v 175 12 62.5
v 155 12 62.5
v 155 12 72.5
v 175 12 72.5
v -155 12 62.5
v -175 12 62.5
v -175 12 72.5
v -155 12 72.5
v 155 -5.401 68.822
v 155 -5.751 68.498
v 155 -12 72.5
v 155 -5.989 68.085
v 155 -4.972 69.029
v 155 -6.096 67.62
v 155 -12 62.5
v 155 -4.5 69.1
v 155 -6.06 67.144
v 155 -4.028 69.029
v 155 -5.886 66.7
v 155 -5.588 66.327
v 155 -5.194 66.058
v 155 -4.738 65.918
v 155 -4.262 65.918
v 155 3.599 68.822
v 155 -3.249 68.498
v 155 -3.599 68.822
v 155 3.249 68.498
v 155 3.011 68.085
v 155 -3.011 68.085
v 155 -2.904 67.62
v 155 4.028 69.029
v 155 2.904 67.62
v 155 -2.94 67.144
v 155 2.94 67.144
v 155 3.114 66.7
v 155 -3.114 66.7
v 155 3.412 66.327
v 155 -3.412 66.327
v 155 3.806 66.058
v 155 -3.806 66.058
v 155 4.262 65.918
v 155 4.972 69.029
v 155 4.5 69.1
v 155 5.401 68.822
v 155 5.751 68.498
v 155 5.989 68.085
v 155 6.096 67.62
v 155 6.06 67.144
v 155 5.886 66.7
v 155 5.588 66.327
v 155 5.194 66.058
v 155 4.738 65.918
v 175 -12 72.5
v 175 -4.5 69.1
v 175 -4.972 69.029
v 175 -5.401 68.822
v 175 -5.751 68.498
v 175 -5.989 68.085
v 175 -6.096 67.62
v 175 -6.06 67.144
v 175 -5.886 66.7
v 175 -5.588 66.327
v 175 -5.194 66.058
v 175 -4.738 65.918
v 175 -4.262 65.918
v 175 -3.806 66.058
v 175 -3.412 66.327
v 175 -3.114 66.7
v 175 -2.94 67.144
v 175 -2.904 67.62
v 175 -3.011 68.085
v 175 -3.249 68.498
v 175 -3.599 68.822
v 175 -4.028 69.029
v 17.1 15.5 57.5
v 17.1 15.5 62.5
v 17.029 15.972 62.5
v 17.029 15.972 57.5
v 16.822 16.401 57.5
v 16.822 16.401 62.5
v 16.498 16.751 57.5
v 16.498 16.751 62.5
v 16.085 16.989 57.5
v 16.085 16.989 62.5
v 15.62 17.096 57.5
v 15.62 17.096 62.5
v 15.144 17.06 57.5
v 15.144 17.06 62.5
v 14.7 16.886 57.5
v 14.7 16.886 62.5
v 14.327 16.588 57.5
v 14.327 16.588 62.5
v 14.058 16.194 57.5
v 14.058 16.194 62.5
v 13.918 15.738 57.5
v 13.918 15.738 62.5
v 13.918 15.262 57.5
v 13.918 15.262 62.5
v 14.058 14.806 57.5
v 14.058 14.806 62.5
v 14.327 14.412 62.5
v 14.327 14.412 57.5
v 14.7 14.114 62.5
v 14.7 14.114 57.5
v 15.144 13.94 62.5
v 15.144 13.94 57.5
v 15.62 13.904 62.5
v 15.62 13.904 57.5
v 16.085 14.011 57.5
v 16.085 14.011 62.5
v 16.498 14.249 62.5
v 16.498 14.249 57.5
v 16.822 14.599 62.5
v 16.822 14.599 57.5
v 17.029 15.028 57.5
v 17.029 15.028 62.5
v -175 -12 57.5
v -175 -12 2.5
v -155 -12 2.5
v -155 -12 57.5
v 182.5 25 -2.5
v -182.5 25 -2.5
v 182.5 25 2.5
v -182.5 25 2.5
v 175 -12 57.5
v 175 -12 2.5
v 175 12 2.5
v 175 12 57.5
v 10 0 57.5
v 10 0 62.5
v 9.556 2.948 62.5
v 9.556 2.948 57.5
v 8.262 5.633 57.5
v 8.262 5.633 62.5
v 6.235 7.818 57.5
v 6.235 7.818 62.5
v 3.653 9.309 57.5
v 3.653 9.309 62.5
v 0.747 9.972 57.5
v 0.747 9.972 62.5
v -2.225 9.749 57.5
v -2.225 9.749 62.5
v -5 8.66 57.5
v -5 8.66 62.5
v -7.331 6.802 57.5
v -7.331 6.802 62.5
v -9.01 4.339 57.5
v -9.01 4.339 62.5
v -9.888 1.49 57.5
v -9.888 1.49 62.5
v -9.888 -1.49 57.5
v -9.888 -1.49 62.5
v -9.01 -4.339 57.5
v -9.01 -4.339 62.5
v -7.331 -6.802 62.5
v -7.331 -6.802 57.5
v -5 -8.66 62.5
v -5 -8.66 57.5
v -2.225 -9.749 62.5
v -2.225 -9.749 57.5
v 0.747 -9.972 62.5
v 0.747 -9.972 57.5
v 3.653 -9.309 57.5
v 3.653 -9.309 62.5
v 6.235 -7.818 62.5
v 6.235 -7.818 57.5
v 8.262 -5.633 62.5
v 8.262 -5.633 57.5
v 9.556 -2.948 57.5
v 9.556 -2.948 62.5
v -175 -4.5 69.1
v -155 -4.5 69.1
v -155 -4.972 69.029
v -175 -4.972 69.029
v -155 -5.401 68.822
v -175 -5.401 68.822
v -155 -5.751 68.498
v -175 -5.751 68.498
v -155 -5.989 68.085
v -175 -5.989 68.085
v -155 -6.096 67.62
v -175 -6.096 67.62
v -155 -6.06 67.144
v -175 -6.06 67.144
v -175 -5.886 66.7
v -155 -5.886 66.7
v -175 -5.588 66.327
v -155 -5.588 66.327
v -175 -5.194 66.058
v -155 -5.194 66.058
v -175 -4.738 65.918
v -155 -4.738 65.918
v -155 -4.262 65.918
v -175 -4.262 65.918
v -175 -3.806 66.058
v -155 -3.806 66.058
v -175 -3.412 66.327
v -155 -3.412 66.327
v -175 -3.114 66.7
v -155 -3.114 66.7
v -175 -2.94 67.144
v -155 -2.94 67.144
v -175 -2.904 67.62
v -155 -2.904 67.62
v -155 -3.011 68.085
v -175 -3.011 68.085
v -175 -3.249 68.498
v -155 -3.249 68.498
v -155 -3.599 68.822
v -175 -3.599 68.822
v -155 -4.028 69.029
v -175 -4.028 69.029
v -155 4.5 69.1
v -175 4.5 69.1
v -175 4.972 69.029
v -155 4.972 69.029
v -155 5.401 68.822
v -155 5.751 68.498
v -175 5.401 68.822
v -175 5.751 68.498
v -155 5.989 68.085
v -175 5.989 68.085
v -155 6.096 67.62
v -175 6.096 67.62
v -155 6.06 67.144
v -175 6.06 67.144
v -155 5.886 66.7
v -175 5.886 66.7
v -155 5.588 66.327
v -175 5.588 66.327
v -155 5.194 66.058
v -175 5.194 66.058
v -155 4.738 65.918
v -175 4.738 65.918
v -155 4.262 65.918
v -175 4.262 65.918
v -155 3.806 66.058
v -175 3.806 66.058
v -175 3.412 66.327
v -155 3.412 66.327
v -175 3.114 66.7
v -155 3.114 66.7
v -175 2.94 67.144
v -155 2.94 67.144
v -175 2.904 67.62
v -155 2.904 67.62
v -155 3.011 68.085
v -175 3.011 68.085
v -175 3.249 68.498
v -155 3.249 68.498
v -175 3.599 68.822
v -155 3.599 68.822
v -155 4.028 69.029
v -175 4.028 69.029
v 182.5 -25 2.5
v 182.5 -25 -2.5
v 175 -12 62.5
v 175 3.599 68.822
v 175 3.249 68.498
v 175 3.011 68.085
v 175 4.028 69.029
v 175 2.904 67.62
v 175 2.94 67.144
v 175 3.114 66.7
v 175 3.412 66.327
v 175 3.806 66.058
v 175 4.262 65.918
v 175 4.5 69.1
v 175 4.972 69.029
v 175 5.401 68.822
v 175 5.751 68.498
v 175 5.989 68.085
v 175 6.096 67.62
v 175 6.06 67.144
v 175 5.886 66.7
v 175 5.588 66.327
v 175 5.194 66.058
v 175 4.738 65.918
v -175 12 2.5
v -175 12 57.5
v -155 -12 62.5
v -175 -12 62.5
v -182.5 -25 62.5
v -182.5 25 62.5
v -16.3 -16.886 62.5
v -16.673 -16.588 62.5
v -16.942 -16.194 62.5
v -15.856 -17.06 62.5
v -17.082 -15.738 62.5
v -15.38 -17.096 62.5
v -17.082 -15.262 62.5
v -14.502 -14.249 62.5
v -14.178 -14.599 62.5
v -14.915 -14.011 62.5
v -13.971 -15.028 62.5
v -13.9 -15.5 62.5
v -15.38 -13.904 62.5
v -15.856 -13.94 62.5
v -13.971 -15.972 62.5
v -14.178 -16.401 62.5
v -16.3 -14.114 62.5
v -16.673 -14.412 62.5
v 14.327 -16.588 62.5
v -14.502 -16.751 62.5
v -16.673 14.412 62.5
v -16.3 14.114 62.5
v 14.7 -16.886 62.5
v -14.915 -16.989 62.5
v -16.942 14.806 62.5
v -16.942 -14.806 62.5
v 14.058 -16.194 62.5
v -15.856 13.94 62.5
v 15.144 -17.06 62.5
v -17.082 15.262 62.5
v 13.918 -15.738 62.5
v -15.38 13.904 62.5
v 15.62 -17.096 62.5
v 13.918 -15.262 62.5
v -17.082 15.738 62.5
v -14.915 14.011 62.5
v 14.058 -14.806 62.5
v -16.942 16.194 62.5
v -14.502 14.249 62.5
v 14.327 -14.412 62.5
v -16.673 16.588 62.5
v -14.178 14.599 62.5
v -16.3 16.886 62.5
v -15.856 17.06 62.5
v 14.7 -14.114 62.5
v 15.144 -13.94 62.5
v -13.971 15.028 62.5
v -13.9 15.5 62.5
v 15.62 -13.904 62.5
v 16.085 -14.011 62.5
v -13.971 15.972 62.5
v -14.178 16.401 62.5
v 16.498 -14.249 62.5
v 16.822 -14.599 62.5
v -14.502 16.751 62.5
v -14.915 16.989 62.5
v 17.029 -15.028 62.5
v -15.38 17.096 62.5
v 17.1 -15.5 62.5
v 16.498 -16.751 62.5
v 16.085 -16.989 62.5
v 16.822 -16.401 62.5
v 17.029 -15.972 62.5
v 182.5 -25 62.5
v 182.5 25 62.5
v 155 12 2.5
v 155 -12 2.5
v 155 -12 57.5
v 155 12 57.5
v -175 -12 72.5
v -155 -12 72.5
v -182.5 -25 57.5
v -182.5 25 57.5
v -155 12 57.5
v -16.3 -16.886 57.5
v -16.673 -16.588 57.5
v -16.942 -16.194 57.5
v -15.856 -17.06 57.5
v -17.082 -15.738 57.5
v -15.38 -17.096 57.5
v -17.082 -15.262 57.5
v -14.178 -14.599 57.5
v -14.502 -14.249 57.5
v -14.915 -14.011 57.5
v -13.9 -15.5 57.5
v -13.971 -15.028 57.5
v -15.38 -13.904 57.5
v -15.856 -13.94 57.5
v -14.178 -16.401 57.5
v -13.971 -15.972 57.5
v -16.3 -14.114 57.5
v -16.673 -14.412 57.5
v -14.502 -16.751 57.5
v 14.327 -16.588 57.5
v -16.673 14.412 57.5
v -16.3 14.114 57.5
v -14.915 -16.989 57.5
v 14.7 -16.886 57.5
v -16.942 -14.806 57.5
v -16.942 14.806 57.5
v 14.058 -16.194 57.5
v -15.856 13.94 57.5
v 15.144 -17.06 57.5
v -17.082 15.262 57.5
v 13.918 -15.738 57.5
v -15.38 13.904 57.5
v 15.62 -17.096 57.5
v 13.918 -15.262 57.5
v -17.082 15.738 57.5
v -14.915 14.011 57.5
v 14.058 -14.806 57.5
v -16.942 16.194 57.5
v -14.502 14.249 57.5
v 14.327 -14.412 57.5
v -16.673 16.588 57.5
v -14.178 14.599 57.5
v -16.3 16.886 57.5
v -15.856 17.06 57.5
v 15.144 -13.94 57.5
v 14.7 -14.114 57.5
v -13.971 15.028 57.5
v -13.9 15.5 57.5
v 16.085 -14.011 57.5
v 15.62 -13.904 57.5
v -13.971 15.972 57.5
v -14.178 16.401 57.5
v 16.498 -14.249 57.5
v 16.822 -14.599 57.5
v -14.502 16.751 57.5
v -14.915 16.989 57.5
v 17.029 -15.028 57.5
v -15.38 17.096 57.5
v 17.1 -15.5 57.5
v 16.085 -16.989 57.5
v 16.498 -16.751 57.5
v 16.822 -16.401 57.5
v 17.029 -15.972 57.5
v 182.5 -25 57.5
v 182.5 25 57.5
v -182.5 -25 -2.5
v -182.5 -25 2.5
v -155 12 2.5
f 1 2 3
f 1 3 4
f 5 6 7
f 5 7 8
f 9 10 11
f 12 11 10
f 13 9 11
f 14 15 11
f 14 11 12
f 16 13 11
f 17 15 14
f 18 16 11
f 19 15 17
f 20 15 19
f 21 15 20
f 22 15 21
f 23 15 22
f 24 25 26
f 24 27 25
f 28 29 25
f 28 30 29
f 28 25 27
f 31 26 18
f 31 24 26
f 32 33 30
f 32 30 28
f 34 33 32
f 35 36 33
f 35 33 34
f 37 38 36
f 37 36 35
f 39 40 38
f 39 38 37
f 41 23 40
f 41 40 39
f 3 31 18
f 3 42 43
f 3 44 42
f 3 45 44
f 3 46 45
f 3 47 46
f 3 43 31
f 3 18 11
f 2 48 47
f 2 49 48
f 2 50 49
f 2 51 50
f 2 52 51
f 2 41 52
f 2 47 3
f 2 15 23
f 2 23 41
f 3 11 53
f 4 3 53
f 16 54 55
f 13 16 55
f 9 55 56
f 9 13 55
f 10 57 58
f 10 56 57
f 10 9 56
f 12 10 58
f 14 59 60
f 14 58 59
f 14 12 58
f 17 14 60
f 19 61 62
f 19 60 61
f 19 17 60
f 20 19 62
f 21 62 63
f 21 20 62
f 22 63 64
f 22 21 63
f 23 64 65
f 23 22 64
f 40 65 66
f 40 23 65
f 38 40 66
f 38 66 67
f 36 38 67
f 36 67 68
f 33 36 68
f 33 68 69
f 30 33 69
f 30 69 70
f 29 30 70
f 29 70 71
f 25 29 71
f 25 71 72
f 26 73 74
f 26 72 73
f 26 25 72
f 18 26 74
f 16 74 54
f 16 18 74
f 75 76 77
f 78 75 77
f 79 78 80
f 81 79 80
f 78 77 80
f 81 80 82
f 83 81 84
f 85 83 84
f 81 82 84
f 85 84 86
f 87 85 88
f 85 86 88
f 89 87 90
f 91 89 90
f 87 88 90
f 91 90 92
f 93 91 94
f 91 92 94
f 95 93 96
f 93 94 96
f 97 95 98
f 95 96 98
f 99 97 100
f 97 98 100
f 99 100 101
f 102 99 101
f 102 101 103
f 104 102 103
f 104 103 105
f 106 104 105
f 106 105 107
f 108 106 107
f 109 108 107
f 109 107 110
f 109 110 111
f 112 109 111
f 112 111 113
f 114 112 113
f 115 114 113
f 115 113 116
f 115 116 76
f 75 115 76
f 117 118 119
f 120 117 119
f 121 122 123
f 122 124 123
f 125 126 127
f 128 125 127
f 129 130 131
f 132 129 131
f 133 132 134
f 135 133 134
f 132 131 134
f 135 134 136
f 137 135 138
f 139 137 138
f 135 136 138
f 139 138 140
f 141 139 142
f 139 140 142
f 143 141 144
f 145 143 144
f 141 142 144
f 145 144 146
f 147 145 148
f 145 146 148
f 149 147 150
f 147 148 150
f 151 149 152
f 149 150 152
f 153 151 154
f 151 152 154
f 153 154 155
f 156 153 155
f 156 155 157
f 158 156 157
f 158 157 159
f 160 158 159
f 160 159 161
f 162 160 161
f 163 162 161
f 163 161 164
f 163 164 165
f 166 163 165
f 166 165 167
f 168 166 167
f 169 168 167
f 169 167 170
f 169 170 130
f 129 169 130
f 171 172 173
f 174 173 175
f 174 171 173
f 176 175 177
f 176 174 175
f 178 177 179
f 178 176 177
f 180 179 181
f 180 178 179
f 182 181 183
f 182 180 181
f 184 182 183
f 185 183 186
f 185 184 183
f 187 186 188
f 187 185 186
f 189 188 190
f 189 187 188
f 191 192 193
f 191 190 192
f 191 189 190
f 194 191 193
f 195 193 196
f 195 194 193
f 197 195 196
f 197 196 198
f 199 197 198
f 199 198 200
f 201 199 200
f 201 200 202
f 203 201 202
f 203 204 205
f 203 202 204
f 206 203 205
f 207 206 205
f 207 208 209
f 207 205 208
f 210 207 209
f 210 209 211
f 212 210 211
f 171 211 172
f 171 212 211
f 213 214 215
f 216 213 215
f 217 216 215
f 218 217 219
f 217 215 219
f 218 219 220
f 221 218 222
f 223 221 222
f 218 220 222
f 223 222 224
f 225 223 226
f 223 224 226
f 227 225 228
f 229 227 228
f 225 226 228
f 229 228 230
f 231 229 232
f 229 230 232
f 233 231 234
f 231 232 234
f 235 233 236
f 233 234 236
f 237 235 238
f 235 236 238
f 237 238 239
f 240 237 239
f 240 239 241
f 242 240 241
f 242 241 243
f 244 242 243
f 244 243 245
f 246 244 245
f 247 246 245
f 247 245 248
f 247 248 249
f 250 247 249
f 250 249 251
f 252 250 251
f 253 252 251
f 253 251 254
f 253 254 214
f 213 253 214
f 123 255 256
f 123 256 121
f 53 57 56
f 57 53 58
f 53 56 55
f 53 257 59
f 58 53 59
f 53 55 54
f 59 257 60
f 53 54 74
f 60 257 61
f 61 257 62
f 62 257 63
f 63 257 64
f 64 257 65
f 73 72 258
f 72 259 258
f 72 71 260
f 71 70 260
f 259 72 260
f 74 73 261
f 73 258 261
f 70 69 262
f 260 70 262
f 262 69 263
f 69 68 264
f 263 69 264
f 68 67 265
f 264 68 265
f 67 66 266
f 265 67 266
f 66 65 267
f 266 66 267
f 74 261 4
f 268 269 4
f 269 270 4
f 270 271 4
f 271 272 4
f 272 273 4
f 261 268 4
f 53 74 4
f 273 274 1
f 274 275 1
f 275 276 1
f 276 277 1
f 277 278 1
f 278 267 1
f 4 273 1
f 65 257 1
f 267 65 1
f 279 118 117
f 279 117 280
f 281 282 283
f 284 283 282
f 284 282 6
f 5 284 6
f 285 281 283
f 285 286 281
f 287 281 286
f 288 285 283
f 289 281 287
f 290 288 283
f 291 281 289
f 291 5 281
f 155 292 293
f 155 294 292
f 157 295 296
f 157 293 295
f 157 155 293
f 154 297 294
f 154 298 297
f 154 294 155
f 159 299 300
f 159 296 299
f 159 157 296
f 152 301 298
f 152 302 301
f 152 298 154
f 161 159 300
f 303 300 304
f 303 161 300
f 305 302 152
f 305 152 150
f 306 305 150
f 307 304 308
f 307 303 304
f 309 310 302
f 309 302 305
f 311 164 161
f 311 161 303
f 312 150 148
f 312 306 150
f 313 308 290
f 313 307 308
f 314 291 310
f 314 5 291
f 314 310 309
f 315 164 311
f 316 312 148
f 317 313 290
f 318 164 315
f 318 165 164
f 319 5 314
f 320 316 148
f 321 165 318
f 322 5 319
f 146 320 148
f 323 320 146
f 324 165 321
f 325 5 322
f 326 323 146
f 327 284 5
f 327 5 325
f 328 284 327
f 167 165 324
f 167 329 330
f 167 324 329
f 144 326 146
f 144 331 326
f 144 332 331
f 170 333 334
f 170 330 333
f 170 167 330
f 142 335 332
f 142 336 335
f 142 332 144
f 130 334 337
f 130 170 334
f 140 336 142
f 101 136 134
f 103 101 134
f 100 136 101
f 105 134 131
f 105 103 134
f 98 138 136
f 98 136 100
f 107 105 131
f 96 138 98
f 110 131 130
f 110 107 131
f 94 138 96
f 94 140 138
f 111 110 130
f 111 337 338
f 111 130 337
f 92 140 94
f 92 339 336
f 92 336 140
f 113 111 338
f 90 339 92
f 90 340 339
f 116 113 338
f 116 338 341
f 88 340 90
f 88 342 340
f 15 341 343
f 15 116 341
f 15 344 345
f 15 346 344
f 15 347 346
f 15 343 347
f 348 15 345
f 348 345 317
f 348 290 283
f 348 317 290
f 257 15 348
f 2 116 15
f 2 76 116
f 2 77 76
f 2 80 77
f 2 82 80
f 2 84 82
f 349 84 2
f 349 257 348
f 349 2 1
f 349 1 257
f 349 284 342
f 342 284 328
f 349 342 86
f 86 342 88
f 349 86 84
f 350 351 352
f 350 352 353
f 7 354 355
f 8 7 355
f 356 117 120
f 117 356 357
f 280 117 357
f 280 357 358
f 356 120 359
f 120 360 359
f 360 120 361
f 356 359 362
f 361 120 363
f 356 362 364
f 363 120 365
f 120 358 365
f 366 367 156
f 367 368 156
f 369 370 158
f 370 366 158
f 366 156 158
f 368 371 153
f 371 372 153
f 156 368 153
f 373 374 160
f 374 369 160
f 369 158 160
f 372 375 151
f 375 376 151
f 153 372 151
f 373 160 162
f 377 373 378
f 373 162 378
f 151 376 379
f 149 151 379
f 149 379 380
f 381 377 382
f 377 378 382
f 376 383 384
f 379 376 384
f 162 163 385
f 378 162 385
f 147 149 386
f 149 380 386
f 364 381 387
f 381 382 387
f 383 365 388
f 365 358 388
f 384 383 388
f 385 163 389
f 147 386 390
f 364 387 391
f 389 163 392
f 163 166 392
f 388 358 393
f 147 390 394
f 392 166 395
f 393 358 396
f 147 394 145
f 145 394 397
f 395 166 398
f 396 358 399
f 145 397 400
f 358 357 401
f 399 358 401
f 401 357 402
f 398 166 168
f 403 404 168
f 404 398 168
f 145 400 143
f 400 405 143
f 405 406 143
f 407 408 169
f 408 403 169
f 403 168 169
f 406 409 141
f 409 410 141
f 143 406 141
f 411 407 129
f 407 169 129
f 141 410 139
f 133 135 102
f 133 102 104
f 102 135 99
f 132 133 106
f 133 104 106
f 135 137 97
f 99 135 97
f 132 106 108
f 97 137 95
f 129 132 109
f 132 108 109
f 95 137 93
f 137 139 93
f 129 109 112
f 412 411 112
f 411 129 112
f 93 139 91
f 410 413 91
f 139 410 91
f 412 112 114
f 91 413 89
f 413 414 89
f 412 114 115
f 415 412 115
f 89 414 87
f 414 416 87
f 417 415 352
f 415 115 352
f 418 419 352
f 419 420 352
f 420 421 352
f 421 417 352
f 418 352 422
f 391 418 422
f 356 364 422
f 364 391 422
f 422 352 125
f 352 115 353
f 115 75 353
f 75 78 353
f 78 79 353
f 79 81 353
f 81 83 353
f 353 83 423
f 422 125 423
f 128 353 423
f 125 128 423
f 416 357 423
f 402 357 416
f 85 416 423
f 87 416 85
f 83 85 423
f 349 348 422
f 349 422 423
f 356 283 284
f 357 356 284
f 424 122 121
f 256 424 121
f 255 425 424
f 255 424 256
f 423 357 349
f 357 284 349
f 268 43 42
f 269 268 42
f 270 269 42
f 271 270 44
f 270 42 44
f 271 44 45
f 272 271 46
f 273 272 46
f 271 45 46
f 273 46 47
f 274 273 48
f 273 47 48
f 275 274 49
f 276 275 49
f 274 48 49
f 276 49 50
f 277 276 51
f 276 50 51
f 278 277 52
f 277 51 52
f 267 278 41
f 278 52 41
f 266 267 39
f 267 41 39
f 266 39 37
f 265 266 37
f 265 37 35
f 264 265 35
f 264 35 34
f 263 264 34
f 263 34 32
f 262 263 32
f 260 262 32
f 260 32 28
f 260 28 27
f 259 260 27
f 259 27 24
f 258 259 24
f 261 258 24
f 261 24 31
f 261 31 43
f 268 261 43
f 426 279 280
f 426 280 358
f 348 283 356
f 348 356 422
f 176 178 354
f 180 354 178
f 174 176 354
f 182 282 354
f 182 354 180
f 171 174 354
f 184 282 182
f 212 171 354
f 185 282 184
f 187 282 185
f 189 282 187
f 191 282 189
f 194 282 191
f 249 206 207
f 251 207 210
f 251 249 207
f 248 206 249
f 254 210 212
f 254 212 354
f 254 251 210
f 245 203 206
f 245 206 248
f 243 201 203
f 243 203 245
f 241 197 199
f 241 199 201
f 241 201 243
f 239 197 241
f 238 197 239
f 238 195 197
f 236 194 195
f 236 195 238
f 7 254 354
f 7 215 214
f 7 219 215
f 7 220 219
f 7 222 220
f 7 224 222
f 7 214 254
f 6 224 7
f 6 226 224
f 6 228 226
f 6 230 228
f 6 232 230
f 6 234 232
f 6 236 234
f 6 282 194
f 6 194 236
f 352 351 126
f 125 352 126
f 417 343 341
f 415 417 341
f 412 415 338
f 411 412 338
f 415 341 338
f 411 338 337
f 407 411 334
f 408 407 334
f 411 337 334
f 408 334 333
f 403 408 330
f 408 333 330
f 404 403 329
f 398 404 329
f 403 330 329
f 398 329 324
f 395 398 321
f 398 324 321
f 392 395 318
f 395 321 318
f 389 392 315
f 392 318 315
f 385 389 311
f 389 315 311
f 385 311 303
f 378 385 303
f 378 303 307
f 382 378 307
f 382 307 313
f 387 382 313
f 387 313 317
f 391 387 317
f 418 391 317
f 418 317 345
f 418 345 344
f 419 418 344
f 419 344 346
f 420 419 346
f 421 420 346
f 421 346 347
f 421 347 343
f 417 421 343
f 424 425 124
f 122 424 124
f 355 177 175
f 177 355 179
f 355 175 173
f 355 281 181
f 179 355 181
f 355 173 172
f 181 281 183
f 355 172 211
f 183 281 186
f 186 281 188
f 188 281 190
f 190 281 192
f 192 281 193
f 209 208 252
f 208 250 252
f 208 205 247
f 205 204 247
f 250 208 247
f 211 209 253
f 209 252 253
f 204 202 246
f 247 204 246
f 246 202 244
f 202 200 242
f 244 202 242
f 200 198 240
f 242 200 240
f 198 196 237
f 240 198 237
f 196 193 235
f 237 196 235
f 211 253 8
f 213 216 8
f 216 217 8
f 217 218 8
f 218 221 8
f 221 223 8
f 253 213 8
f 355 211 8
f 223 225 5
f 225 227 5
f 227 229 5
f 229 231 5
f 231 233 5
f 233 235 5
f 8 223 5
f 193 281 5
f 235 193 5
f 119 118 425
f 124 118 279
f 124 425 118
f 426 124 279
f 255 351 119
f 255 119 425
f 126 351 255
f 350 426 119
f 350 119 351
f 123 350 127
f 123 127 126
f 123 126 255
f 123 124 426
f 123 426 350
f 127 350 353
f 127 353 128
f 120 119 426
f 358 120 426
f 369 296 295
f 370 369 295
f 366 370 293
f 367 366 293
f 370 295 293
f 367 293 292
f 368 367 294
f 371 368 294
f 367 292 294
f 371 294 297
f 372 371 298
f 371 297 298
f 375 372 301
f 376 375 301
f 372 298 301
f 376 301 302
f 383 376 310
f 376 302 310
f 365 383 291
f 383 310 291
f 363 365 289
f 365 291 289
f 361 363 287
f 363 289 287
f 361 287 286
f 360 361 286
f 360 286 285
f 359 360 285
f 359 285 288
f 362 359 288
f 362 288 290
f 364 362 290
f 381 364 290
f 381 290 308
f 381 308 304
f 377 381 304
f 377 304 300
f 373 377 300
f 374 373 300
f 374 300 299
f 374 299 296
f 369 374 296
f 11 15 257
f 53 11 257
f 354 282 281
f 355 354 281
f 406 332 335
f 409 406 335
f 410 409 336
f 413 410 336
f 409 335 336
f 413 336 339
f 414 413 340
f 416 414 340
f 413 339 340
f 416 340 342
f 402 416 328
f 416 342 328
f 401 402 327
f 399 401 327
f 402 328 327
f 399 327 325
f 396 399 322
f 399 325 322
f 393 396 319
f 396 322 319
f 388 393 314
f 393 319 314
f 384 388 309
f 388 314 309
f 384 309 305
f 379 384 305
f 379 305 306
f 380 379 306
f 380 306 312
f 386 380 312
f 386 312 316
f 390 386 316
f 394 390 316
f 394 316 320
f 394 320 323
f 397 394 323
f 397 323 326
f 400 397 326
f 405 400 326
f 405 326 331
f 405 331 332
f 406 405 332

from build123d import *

# Parameters (mm, degrees)
SKETCH_1_W             = 365
SKETCH_1_H             = 50
EXTRUDE_1_DEPTH        = 2.5
SKETCH_2_W             = 20
SKETCH_2_H             = 24
EXTRUDE_2_DEPTH        = 70
PATTERN_LINEAR_1_COUNT = 2
PATTERN_LINEAR_1_PITCH = 60
SKETCH_4_R             = 1.6
CUT_EXTRUDE_1_DEPTH    = 366.633012733
CUT_EXTRUDE_2_REACH    = 197.336
SKETCH_5_R             = 1.6
SKETCH_5_R_2           = 10


with BuildPart() as part:
    # 草图1 → 凸台-拉伸1 (new, symmetric)
    with BuildSketch(Plane.XY):
        Rectangle(SKETCH_1_W, SKETCH_1_H)
    extrude_1 = extrude(amount=EXTRUDE_1_DEPTH, both=True)

    # 草图2 → 凸台-拉伸2 (add)
    with BuildSketch(Plane.XY.offset(2.5)):
        with Locations((165, 0)):
            Rectangle(SKETCH_2_W, SKETCH_2_H)
        with Locations((-165, 0)):
            Rectangle(SKETCH_2_W, SKETCH_2_H)
    extrude(amount=EXTRUDE_2_DEPTH)

    # 阵列(线性)1: 凸台-拉伸1 ×2
    with Locations(*[(0, 0, i * PATTERN_LINEAR_1_PITCH) for i in range(1, PATTERN_LINEAR_1_COUNT)]):
        add(extrude_1)

    # 草图4 → 切除-拉伸1 (cut, through all)
    with BuildSketch(Plane.ZY.offset(175)):
        with Locations((67.5, 4.5)):
            Circle(SKETCH_4_R)
    cut_extrude_1 = extrude(amount=-CUT_EXTRUDE_1_DEPTH, mode=Mode.SUBTRACT)

    # 草图5 → 切除-拉伸2 (cut, up to next)
    with BuildSketch(Plane.XY.offset(62.5), mode=Mode.PRIVATE) as cut_extrude_2_sk1:
        with Locations((-15.5, 15.5)):
            Circle(SKETCH_5_R)
    cut_extrude_2_tool1 = extrude(cut_extrude_2_sk1.sketch, amount=-CUT_EXTRUDE_2_REACH, mode=Mode.PRIVATE) & part.part
    # 草图5 → 切除-拉伸2 (cut, up to next)
    with BuildSketch(Plane.XY.offset(62.5), mode=Mode.PRIVATE) as cut_extrude_2_sk2:
        with Locations((15.5, 15.5)):
            Circle(SKETCH_5_R)
    cut_extrude_2_tool2 = extrude(cut_extrude_2_sk2.sketch, amount=-CUT_EXTRUDE_2_REACH, mode=Mode.PRIVATE) & part.part
    # 草图5 → 切除-拉伸2 (cut, up to next)
    with BuildSketch(Plane.XY.offset(62.5), mode=Mode.PRIVATE) as cut_extrude_2_sk3:
        with Locations((15.5, -15.5)):
            Circle(SKETCH_5_R)
    cut_extrude_2_tool3 = extrude(cut_extrude_2_sk3.sketch, amount=-CUT_EXTRUDE_2_REACH, mode=Mode.PRIVATE) & part.part
    # 草图5 → 切除-拉伸2 (cut, up to next)
    with BuildSketch(Plane.XY.offset(62.5), mode=Mode.PRIVATE) as cut_extrude_2_sk4:
        with Locations((-15.5, -15.5)):
            Circle(SKETCH_5_R)
    cut_extrude_2_tool4 = extrude(cut_extrude_2_sk4.sketch, amount=-CUT_EXTRUDE_2_REACH, mode=Mode.PRIVATE) & part.part
    # 草图5 → 切除-拉伸2 (cut, up to next)
    with BuildSketch(Plane.XY.offset(62.5), mode=Mode.PRIVATE) as cut_extrude_2_sk5:
        Circle(SKETCH_5_R_2)
    cut_extrude_2_tool5 = extrude(cut_extrude_2_sk5.sketch, amount=-CUT_EXTRUDE_2_REACH, mode=Mode.PRIVATE) & part.part
    add(cut_extrude_2_tool1.solids().sort_by_distance((-15.5, 15.5, 62.5))[0], mode=Mode.SUBTRACT)
    add(cut_extrude_2_tool2.solids().sort_by_distance((15.5, 15.5, 62.5))[0], mode=Mode.SUBTRACT)
    add(cut_extrude_2_tool3.solids().sort_by_distance((15.5, -15.5, 62.5))[0], mode=Mode.SUBTRACT)
    add(cut_extrude_2_tool4.solids().sort_by_distance((-15.5, -15.5, 62.5))[0], mode=Mode.SUBTRACT)
    add(cut_extrude_2_tool5.solids().sort_by_distance((0, 0, 62.5))[0], mode=Mode.SUBTRACT)

    # 镜向1: 切除-拉伸1 across plane
    add(cut_extrude_1.mirror(Plane.ZX), mode=Mode.SUBTRACT)


solid = part.part
